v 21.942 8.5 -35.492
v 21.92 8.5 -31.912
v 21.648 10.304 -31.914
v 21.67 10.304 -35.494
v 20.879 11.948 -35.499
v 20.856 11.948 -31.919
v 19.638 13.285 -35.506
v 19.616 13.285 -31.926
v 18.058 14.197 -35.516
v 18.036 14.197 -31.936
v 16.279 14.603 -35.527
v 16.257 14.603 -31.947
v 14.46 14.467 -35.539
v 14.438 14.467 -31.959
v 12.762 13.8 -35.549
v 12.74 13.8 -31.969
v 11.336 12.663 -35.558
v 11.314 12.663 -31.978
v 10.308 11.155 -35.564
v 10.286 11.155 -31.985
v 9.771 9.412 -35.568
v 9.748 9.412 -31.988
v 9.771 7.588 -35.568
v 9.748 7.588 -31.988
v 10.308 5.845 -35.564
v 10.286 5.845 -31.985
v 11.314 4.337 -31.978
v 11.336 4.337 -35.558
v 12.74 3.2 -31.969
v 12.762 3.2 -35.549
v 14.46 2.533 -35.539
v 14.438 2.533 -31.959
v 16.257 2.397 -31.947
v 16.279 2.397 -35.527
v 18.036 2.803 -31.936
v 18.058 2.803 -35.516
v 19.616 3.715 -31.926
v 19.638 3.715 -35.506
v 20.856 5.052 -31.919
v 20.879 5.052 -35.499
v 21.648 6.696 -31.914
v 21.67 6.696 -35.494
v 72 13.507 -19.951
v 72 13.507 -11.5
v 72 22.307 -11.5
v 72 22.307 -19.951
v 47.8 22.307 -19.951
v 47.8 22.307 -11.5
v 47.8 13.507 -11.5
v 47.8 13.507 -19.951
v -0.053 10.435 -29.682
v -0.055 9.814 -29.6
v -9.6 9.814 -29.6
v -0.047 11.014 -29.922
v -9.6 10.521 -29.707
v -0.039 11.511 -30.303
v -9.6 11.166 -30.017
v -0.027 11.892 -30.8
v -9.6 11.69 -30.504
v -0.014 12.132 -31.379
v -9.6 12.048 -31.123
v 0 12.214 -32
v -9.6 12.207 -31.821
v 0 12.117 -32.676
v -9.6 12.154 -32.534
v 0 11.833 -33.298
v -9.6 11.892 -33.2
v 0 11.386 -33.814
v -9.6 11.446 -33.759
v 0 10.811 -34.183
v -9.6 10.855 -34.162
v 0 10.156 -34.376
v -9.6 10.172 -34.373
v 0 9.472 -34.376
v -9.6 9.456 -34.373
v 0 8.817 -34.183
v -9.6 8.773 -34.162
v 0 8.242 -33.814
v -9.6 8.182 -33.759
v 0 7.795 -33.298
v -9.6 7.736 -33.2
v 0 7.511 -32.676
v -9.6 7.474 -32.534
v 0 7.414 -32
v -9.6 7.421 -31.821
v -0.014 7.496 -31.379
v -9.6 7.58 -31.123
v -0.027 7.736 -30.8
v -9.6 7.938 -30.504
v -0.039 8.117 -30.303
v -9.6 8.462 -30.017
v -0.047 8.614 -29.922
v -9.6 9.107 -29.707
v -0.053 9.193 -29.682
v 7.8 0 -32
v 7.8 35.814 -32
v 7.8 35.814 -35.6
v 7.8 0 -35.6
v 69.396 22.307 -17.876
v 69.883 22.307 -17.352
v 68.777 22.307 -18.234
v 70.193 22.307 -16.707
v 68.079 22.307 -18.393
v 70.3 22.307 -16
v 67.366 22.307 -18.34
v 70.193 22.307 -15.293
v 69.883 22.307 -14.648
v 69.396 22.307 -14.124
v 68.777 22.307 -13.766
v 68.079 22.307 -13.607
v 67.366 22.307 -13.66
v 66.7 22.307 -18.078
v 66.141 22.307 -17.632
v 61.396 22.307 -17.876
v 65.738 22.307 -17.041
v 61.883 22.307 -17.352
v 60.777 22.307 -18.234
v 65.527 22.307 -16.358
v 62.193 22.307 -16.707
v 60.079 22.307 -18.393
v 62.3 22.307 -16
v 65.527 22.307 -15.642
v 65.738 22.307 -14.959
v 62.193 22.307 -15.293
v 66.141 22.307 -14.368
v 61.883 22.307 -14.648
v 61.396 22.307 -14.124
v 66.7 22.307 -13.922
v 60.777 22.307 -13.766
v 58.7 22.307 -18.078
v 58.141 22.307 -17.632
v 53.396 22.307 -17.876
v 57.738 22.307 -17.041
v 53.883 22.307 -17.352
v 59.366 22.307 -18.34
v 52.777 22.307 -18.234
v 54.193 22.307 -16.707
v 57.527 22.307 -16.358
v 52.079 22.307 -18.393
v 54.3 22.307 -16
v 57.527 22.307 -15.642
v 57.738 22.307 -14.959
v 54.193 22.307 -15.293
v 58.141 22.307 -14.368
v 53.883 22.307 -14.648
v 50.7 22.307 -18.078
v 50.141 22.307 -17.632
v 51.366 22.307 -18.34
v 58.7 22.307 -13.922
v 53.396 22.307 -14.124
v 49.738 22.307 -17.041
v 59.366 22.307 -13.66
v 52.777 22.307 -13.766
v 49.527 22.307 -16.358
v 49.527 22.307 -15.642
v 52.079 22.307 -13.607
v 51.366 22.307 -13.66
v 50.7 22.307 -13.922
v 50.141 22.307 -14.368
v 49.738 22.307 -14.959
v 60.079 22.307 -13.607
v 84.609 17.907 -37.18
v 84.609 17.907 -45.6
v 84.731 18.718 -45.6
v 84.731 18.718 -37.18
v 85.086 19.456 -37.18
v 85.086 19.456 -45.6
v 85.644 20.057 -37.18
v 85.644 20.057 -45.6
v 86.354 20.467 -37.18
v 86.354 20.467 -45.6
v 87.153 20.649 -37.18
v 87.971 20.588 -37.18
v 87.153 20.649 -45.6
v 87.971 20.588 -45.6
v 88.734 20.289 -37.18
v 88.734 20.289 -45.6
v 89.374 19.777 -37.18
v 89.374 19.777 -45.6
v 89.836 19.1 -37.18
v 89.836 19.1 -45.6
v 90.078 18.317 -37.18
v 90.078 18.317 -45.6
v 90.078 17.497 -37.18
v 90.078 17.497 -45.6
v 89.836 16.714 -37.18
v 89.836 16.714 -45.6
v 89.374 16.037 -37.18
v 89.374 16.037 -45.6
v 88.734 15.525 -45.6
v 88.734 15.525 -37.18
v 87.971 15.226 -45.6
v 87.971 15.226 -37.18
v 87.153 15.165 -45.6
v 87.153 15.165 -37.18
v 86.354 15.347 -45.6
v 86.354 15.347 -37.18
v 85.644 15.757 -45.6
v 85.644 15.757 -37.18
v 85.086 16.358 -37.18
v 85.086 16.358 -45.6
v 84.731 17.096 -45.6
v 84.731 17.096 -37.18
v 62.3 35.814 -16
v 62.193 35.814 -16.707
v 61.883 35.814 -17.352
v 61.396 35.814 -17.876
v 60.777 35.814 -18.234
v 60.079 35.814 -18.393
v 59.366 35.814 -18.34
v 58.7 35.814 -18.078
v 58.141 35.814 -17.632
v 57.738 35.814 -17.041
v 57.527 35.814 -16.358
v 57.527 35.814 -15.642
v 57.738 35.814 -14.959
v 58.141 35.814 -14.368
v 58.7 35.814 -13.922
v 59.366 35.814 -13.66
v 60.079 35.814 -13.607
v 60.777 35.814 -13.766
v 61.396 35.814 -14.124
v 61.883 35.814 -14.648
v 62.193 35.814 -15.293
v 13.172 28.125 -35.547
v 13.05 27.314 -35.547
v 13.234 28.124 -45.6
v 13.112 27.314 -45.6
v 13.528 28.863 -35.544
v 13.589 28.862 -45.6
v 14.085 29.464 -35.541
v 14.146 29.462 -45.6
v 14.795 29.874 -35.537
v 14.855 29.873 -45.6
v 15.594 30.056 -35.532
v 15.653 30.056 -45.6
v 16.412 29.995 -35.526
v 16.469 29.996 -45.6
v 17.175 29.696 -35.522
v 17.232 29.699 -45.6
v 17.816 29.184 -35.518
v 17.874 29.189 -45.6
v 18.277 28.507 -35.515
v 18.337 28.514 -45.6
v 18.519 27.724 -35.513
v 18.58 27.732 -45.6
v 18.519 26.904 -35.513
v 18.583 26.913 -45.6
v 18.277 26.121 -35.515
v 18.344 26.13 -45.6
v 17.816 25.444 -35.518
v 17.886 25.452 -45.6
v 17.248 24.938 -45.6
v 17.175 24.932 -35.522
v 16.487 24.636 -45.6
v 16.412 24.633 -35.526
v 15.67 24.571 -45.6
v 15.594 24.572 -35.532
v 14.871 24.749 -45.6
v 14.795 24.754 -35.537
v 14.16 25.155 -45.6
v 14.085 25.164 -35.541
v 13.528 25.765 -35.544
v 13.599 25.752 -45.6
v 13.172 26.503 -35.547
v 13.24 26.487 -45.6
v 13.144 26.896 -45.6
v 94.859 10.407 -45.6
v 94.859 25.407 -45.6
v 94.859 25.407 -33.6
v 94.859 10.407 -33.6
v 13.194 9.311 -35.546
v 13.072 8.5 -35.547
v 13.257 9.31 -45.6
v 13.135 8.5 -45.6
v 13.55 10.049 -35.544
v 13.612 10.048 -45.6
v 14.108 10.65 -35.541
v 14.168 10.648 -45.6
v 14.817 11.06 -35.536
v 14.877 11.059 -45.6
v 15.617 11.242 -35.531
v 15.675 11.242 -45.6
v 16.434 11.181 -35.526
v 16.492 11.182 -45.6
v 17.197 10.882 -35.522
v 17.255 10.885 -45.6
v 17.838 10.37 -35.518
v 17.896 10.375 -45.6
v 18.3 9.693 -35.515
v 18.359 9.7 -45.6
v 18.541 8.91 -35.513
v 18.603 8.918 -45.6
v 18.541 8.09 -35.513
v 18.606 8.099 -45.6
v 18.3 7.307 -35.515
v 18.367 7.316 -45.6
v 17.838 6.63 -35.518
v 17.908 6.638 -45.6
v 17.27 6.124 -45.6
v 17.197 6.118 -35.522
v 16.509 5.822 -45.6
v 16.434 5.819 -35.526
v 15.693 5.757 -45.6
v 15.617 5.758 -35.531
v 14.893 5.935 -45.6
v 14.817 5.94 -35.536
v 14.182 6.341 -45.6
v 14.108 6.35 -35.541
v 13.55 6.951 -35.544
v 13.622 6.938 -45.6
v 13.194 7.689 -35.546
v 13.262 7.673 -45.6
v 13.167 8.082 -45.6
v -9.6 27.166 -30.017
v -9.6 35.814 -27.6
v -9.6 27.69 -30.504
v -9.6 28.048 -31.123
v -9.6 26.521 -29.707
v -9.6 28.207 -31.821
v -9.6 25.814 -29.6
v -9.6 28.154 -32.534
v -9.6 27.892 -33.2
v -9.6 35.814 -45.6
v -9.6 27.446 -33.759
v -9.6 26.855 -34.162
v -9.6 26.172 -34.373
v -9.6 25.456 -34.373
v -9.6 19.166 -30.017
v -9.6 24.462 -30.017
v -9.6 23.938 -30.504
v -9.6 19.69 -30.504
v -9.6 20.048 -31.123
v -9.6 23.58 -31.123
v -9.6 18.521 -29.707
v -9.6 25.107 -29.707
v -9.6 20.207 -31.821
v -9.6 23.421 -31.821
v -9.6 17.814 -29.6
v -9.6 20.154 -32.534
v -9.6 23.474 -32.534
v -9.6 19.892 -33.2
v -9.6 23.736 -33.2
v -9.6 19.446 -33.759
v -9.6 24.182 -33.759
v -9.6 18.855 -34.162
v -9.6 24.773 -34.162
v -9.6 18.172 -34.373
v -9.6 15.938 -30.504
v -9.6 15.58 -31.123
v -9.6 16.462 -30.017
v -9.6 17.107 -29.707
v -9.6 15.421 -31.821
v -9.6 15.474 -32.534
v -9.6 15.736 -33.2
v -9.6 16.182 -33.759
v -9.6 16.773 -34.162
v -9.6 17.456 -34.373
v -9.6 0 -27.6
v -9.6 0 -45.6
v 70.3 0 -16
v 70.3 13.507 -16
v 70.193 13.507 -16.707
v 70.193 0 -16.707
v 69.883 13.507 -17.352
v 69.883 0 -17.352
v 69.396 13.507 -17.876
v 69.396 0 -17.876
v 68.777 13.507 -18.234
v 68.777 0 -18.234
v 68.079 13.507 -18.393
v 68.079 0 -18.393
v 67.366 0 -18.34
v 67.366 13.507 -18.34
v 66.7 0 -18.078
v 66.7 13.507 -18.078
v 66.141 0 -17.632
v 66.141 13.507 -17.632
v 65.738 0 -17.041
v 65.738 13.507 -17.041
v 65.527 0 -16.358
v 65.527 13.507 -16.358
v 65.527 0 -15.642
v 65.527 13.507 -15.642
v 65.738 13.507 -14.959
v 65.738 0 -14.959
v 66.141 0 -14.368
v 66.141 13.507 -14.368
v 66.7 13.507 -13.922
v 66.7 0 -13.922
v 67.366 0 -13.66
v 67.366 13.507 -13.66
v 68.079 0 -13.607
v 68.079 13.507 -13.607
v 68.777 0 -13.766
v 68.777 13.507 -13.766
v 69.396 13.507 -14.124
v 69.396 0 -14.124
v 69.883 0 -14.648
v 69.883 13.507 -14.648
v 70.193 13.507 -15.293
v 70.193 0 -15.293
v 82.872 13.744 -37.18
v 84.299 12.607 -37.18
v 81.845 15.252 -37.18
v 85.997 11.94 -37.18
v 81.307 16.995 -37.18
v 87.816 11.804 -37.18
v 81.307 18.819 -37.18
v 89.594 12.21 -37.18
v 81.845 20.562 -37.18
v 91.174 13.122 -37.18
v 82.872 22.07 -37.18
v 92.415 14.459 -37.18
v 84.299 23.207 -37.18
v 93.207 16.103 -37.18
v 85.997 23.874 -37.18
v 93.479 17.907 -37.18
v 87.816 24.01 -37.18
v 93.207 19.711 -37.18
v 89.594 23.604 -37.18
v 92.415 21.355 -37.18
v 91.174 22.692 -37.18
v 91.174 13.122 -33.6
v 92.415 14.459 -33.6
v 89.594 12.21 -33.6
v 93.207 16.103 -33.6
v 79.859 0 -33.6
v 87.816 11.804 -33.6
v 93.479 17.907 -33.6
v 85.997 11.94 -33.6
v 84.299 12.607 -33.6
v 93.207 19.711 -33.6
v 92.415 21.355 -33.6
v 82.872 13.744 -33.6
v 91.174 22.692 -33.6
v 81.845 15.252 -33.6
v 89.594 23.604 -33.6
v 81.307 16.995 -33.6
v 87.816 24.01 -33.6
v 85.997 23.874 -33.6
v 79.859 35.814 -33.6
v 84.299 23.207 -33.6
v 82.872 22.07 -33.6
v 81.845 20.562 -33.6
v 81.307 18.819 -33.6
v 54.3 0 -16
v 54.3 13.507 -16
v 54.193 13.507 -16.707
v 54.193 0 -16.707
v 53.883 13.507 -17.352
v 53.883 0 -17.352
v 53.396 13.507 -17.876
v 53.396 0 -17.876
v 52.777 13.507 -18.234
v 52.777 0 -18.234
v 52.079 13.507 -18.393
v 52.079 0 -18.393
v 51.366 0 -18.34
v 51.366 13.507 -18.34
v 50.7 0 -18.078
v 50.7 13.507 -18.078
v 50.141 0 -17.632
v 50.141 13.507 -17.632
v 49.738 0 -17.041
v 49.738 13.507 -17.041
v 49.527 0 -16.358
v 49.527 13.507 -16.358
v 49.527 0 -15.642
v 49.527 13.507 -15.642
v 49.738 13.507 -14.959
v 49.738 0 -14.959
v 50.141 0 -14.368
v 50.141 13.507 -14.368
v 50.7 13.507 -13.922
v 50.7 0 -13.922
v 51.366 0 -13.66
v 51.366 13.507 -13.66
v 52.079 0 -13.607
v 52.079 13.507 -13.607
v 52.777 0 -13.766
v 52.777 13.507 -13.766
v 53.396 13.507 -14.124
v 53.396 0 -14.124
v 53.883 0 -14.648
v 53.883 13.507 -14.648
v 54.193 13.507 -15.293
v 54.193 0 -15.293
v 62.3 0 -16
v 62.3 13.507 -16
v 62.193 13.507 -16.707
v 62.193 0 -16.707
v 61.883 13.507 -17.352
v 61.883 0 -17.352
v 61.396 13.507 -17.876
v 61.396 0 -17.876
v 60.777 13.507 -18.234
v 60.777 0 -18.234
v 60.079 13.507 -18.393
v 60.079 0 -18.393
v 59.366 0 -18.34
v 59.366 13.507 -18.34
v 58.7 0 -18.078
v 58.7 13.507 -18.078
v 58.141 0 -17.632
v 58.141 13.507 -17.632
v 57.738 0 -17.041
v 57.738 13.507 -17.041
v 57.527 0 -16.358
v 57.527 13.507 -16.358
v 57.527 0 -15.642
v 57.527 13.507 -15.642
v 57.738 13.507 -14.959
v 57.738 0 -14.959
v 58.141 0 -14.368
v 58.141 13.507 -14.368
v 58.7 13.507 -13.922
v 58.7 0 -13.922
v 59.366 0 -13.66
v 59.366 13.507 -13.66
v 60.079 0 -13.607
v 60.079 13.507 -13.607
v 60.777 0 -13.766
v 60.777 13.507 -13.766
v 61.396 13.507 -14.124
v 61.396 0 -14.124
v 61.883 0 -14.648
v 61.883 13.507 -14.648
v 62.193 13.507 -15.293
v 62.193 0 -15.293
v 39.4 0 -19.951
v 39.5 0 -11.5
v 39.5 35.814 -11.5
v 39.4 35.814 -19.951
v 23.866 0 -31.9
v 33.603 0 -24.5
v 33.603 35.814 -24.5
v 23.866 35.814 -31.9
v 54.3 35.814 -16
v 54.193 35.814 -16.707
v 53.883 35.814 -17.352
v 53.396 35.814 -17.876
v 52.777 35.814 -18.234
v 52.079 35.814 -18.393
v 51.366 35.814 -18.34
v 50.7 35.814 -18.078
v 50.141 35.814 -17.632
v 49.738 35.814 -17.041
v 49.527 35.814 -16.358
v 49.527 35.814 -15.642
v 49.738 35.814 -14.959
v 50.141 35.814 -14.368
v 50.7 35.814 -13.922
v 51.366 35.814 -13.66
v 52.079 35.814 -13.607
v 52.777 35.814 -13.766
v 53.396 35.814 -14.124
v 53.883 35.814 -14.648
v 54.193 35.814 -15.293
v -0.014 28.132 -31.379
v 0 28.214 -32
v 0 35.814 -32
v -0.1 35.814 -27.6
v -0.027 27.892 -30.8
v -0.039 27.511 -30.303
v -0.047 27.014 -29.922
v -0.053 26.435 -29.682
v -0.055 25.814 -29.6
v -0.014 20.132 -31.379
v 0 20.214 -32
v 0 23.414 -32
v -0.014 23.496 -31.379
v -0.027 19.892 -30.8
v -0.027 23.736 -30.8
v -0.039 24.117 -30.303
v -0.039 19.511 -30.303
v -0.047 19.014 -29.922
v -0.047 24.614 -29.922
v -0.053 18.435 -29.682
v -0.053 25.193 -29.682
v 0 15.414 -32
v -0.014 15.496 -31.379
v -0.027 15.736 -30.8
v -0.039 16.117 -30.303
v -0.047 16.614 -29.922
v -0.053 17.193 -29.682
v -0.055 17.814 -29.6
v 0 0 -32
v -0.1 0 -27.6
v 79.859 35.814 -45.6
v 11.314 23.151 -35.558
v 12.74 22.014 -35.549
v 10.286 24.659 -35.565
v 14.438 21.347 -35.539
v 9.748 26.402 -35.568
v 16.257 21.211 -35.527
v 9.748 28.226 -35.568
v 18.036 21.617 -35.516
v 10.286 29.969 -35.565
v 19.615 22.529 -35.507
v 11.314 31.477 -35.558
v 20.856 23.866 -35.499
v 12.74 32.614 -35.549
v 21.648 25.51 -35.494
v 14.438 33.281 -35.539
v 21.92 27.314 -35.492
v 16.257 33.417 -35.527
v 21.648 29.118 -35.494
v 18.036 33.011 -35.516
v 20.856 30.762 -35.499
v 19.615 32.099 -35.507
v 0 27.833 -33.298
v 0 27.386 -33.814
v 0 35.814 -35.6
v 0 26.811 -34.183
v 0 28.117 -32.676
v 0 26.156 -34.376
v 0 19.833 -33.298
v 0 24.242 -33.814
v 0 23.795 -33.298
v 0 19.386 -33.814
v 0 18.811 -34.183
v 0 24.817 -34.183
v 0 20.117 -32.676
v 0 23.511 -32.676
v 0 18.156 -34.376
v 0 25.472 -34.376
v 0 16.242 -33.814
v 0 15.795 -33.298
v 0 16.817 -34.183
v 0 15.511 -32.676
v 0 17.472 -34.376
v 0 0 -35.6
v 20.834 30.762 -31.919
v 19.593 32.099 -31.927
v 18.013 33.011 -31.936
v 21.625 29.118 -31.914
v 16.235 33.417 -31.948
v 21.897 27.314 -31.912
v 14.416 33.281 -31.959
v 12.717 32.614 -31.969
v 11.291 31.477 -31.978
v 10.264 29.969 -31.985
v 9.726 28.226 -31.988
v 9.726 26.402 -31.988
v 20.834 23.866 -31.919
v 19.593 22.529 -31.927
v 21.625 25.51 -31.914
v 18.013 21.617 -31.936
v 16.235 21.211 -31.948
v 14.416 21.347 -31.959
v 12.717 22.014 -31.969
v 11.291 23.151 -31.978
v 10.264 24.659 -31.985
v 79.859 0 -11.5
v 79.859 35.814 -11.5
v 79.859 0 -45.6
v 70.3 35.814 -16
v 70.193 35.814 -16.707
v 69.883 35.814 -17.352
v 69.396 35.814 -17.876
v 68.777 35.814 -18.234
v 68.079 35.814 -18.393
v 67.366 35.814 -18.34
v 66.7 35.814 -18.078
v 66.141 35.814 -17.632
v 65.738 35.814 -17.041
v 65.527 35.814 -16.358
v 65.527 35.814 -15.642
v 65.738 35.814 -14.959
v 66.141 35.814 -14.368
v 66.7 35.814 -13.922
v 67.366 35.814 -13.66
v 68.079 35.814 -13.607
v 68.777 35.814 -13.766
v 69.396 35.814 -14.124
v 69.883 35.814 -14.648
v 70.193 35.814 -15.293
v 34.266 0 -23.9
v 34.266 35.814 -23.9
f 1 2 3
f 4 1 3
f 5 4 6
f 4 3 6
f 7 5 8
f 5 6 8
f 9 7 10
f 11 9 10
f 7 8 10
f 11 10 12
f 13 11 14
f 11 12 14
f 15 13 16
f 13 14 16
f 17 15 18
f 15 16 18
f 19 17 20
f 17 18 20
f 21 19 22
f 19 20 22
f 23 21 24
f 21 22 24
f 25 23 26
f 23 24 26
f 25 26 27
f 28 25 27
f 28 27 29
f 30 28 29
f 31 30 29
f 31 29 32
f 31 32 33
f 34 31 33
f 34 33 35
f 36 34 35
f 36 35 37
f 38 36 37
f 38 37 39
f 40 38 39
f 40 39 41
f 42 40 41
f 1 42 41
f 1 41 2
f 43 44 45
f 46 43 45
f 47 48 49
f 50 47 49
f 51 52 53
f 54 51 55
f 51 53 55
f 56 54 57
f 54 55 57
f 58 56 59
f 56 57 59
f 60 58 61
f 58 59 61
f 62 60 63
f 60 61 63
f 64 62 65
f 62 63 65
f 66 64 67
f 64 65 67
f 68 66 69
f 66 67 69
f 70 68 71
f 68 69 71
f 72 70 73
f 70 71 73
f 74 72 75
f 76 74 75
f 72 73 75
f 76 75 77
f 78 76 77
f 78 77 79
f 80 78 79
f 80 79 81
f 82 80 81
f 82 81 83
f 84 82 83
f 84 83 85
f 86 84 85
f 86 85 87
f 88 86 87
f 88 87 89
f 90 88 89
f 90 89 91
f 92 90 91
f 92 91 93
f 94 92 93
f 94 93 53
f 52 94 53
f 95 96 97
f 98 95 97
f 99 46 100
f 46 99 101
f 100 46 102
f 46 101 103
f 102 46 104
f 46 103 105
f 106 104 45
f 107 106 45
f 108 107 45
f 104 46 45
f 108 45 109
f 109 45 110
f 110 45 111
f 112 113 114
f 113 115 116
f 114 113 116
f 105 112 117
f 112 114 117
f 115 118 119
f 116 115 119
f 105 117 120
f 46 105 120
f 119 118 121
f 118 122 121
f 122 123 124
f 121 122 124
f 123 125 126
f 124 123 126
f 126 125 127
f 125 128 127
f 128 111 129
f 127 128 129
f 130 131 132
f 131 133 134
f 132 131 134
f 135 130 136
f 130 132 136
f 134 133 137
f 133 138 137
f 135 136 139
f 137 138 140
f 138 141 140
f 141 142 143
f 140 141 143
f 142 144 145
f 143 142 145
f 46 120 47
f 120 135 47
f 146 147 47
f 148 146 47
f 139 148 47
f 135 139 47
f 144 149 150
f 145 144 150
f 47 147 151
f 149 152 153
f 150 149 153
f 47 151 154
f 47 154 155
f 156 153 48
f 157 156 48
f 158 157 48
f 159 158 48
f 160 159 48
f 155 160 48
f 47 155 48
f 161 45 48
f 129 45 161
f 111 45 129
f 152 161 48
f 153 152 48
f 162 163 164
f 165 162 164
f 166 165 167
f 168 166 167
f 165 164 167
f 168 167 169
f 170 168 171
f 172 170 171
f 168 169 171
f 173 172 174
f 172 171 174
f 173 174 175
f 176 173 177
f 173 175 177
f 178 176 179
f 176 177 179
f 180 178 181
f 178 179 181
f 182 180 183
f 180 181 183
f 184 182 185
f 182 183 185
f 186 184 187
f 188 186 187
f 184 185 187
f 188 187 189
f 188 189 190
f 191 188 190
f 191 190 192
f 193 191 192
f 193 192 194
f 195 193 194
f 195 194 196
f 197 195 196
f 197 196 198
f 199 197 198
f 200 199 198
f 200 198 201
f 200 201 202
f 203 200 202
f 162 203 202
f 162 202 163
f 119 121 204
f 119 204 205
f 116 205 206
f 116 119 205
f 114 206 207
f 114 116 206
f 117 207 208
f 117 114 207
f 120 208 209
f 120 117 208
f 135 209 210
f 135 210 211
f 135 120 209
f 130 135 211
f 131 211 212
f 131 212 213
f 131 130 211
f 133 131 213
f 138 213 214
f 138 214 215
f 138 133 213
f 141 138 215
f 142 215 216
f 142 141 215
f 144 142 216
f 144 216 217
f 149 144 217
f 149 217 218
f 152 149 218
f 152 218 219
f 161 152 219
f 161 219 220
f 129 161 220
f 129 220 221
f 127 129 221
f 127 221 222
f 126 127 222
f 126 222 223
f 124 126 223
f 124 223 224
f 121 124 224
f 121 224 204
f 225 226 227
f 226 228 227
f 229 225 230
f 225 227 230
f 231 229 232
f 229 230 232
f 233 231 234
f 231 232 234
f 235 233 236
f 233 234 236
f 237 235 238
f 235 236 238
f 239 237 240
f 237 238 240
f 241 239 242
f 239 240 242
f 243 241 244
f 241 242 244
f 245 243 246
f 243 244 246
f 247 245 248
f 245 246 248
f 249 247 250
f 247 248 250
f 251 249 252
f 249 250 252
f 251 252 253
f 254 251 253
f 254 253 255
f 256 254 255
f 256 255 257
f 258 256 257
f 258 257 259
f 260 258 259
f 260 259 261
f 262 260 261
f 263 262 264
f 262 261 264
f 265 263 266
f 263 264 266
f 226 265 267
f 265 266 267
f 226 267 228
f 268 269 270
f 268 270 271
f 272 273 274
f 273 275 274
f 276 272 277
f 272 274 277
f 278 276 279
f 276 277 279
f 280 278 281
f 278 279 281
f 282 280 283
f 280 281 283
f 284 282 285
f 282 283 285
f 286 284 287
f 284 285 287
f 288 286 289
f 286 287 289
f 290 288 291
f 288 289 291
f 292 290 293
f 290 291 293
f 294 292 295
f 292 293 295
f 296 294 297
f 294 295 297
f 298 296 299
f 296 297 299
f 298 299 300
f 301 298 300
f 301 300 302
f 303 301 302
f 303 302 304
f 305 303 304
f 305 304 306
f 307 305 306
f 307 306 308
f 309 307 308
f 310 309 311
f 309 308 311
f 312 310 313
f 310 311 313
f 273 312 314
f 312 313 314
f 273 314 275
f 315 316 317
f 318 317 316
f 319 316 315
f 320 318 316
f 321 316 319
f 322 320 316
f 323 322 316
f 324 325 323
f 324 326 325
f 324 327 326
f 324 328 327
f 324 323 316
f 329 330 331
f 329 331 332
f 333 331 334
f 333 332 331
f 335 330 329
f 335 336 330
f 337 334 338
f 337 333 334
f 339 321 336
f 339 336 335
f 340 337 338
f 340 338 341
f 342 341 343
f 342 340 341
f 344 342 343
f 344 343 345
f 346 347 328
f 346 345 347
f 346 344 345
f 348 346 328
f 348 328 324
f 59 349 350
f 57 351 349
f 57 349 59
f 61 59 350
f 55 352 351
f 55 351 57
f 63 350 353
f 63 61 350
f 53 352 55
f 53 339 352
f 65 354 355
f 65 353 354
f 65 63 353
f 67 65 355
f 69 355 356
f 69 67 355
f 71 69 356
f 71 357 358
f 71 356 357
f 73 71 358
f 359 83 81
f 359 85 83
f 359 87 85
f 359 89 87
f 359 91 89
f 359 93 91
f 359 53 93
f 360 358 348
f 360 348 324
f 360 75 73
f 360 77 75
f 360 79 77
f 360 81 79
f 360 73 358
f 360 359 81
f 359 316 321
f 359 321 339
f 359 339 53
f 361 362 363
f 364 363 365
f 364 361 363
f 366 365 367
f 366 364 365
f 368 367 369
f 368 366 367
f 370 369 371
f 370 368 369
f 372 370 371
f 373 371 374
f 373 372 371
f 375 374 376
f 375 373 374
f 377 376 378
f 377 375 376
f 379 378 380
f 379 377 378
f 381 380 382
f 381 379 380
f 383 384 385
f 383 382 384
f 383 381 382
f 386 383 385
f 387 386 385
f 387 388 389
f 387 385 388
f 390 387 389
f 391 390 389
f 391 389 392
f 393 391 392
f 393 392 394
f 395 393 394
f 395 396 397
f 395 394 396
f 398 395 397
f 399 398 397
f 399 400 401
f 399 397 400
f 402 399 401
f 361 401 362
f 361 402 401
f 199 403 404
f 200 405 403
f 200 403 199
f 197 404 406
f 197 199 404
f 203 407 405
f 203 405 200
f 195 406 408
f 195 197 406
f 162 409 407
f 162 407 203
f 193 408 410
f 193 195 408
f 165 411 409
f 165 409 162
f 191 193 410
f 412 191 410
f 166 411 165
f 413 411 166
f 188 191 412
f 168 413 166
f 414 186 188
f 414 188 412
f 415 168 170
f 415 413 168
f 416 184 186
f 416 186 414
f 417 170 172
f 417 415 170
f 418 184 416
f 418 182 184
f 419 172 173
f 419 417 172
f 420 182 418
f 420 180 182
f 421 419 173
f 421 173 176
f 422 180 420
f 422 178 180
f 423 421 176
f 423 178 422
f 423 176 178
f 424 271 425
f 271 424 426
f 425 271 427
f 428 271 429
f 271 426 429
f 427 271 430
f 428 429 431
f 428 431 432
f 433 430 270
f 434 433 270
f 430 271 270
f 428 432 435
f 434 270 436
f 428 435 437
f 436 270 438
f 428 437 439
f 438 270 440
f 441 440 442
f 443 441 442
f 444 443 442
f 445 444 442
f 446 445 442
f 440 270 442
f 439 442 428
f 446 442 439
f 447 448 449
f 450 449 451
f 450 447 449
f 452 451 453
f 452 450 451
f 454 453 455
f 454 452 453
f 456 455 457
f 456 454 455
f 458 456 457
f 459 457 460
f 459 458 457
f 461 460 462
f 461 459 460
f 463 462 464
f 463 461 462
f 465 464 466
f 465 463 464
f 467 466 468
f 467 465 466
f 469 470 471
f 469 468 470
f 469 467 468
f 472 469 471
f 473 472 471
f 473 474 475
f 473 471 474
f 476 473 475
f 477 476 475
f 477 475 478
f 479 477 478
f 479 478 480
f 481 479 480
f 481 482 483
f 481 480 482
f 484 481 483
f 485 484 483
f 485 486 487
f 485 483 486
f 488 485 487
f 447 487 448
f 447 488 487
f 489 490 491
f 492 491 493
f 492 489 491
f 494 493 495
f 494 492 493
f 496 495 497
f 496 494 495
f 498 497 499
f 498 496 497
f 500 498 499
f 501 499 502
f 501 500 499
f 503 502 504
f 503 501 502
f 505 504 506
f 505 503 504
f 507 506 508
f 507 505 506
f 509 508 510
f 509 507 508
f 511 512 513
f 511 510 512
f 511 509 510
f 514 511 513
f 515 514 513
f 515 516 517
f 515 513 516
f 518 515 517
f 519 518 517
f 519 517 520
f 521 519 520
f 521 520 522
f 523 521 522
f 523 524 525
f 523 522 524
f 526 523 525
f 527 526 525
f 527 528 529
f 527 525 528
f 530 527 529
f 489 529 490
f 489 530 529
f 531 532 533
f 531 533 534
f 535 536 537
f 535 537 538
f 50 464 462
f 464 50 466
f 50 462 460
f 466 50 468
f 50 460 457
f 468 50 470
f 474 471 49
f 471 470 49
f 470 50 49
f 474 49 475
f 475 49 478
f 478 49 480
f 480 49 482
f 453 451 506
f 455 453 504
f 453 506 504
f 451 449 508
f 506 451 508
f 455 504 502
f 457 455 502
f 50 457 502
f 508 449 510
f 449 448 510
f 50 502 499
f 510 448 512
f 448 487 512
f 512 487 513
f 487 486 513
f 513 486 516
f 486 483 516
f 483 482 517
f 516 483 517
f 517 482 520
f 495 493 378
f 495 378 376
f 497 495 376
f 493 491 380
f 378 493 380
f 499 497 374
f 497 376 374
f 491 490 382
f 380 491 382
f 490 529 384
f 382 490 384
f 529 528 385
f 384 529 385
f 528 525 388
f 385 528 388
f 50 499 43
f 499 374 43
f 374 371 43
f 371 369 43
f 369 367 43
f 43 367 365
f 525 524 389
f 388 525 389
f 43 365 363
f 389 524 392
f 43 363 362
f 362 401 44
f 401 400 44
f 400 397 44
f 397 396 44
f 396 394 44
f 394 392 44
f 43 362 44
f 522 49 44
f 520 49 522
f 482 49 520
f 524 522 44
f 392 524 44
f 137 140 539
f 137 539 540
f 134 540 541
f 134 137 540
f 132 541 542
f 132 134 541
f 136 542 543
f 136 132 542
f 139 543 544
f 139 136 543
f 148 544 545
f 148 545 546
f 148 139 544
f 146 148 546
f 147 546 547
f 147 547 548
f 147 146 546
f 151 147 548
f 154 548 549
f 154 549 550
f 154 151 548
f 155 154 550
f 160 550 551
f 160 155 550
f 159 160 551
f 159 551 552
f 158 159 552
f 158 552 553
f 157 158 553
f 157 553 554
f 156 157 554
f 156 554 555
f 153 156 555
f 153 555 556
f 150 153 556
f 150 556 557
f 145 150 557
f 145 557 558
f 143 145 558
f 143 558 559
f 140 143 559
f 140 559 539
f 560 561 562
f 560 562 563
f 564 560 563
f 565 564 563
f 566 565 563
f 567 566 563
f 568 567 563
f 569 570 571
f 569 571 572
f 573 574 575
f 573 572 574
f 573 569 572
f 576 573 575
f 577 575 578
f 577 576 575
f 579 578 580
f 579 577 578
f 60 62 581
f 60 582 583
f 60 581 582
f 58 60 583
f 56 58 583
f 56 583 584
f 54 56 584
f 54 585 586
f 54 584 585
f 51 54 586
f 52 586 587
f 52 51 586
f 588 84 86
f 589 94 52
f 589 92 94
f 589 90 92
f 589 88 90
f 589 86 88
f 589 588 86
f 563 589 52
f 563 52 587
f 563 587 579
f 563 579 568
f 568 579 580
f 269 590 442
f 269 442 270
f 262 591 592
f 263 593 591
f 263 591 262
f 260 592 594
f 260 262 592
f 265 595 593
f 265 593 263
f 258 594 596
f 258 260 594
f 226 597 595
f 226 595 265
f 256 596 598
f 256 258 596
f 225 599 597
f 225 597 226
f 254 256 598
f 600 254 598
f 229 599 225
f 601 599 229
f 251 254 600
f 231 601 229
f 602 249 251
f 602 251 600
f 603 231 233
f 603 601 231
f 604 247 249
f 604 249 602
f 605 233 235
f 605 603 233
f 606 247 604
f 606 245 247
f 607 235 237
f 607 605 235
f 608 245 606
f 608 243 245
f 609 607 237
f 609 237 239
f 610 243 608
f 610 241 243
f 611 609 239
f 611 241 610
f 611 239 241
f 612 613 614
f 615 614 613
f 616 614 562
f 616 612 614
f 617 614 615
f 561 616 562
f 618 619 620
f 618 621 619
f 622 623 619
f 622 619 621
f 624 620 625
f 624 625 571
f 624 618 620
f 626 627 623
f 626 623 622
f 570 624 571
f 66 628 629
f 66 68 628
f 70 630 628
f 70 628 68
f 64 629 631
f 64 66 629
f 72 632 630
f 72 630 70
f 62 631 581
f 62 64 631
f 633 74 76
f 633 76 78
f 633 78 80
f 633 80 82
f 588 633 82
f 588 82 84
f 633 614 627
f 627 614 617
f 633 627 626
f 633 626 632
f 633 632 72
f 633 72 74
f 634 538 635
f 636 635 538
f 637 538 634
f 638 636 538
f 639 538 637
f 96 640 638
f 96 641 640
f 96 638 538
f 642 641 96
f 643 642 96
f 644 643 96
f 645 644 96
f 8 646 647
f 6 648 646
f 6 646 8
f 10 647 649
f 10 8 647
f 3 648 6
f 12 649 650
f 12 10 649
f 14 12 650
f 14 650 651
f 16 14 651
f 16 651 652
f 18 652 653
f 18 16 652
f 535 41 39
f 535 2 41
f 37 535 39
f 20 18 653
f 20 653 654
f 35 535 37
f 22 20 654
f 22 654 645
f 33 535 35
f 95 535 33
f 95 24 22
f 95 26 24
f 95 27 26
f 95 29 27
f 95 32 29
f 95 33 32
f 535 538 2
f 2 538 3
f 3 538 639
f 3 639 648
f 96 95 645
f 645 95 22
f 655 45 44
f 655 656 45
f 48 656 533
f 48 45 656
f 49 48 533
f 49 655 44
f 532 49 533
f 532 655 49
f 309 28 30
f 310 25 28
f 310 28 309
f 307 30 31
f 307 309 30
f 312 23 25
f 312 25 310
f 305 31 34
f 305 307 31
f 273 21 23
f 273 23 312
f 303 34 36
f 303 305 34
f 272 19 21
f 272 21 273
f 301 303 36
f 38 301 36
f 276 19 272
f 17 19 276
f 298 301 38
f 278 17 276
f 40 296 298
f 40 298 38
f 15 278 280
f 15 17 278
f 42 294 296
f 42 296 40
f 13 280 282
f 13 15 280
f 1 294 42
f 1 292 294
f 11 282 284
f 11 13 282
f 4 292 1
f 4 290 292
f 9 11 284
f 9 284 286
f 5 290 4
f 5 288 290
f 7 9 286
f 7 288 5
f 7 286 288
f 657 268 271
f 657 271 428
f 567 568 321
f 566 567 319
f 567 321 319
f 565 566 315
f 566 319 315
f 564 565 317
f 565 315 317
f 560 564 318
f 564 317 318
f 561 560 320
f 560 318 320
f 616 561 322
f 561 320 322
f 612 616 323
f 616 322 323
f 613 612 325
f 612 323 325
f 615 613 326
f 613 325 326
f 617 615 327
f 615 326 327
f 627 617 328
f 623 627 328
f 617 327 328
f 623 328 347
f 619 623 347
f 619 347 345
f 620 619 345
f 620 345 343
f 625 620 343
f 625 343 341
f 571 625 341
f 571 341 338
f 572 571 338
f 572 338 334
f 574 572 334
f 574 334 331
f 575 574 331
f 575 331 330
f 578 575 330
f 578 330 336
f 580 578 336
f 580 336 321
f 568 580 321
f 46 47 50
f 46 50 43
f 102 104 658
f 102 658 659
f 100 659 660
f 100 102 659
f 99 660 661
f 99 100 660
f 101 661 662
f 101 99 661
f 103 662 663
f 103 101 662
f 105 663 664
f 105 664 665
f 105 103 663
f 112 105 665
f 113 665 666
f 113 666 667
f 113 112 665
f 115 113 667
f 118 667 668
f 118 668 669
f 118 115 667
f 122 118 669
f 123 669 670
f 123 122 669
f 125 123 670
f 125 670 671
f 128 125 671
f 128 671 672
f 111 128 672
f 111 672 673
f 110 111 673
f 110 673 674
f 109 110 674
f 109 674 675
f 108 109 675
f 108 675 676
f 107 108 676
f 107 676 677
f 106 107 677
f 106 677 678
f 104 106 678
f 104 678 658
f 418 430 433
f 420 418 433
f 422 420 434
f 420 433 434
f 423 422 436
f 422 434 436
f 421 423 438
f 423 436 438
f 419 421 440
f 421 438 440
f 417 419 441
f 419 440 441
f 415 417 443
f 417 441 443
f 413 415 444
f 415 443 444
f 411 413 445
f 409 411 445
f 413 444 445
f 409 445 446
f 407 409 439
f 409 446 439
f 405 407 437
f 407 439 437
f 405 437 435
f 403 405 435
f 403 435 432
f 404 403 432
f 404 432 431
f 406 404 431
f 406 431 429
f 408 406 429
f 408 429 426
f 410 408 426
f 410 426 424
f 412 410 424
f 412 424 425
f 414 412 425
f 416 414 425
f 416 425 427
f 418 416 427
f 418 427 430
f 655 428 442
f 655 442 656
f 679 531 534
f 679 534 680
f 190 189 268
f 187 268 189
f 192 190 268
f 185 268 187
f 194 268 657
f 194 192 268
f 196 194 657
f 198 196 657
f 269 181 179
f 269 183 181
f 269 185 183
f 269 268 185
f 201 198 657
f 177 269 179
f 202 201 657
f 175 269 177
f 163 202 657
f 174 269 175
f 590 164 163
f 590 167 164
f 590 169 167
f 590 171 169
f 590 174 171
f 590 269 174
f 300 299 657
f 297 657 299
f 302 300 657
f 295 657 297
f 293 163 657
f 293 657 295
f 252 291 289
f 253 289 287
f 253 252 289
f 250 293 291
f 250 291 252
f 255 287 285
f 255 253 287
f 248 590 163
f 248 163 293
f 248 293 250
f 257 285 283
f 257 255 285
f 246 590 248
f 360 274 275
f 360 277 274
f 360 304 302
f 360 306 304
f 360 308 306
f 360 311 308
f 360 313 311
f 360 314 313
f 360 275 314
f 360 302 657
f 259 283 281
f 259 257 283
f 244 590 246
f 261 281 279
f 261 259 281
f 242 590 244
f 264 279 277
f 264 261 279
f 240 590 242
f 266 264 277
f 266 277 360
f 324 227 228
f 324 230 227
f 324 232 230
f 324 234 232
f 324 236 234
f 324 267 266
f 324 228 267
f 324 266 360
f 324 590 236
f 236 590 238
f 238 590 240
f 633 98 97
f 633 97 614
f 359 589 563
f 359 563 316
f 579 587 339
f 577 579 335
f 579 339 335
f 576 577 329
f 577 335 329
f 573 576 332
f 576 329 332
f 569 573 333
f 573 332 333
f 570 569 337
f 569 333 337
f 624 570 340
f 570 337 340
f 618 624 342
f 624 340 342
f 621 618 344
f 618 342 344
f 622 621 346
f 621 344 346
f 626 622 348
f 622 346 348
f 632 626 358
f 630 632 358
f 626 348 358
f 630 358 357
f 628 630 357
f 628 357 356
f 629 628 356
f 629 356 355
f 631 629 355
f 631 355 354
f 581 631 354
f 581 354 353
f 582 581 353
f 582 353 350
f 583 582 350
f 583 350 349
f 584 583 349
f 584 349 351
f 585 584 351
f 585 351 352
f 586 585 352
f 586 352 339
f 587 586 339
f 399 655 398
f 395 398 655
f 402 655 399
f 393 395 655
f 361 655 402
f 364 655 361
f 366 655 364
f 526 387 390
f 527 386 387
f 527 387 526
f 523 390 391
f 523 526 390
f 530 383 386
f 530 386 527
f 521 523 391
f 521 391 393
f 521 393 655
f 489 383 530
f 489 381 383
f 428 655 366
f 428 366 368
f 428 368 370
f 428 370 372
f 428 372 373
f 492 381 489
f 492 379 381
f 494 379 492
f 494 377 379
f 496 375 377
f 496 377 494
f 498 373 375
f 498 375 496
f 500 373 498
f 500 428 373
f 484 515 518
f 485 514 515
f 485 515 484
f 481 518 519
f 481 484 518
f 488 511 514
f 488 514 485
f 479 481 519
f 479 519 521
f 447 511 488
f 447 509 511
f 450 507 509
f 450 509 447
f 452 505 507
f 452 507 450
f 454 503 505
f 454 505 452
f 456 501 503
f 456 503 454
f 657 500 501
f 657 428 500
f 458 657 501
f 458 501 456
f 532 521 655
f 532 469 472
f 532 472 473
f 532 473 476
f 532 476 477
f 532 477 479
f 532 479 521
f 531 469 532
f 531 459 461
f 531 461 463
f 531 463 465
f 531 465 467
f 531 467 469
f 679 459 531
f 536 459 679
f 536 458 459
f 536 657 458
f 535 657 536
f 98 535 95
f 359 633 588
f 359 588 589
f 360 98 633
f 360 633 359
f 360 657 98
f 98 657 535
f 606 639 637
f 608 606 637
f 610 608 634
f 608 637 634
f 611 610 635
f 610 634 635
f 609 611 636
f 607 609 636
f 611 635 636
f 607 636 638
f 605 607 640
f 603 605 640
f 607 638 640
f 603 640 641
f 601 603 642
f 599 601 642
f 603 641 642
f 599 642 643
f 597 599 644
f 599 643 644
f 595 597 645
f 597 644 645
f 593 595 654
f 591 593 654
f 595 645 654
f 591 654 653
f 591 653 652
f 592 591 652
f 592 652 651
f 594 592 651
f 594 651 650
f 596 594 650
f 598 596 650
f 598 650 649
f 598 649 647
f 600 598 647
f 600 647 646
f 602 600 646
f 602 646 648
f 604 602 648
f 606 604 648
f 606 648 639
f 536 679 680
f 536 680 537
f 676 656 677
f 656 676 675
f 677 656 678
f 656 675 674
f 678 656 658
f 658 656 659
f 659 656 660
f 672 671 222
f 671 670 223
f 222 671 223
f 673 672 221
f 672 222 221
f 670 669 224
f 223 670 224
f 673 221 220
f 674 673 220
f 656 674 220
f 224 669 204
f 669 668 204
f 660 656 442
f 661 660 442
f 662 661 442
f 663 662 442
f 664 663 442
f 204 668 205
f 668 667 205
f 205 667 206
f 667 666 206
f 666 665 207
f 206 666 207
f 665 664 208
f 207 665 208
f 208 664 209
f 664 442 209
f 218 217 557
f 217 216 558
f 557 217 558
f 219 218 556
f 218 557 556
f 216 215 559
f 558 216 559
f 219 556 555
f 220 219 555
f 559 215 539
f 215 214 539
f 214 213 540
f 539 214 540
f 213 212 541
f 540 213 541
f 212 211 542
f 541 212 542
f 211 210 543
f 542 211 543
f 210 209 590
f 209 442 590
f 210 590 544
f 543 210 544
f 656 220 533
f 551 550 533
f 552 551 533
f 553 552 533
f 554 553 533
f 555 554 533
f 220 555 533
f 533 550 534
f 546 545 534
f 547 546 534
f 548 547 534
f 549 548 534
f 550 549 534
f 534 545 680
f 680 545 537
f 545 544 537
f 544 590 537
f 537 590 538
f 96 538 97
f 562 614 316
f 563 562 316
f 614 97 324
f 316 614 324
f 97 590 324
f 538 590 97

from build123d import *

# Parameters (mm, degrees)
SKETCH2_R                               = 2.4
BOSS_EXTRUDE1_DEPTH                     = 35.814
CUT_EXTRUDE1_DEPTH                      = 8.45076
CBORE_FOR_M5_HEX_HEAD_BOLT1_D           = 5.5
CBORE_FOR_M5_HEX_HEAD_BOLT1_CBORE_D     = 12.24
CBORE_FOR_M5_HEX_HEAD_BOLT1_CBORE_DEPTH = 3.58
BOSS_EXTRUDE2_DEPTH                     = 12
CBORE_FOR_M5_HEX_HEAD_BOLT2_D           = 5.5
CBORE_FOR_M5_HEX_HEAD_BOLT2_DEPTH       = 12
CBORE_FOR_M5_HEX_HEAD_BOLT2_CBORE_D     = 12.24
CBORE_FOR_M5_HEX_HEAD_BOLT2_CBORE_DEPTH = 3.58
CUT_EXTRUDE2_REACH                      = 106.459
SKETCH11_R                              = 2.4


with BuildPart() as part:
    # Sketch2 → Boss-Extrude1 (new body)
    with BuildSketch(Plane(origin=(0, 0, 0), x_dir=(1, 0, 0), z_dir=(0, 1, 0))):
        Polygon((79.858578644, 45.6), (79.858578644, 11.5), (39.5, 11.5), (39.4, 19.95075985), (34.265987805, 23.9), (33.603154542, 24.5), (23.866312437, 31.9), (7.8, 32), (7.8, 35.6), (0, 35.6), (0, 32), (-0.1, 27.6), (-9.6, 27.6), (-9.6, 45.6), align=None)
        with Locations((67.9, 16)):
            Circle(SKETCH2_R, mode=Mode.SUBTRACT)
        with Locations((51.9, 16)):
            Circle(SKETCH2_R, mode=Mode.SUBTRACT)
        with Locations((59.9, 16)):
            Circle(SKETCH2_R, mode=Mode.SUBTRACT)
    extrude(amount=BOSS_EXTRUDE1_DEPTH)

    # Sketch4 → Cut-Extrude1 (cut)
    with BuildSketch(Plane.XY.offset(-11.5)):
        Polygon((67.9, 22.307), (51.9, 22.307), (47.8, 22.307), (47.8, 13.507), (51.9, 13.507), (67.9, 13.507), (72, 13.507), (72, 22.307), align=None)
    extrude(amount=-CUT_EXTRUDE1_DEPTH, mode=Mode.SUBTRACT)

    # CBORE for M5 Hex Head Bolt1 (through all)
    with Locations(Plane(origin=(0.199468966, 0, -32.047307253), x_dir=(0.99998063, 0, 0.006224083), z_dir=(-0.006224083, 0, 0.99998063))):
        with Locations((15.578271559, 27.314), (15.600678258, 8.5)):
            CounterBoreHole(CBORE_FOR_M5_HEX_HEAD_BOLT1_D / 2, CBORE_FOR_M5_HEX_HEAD_BOLT1_CBORE_D / 2, CBORE_FOR_M5_HEX_HEAD_BOLT1_CBORE_DEPTH)

    # Sketch8 → Boss-Extrude2 (add)
    with BuildSketch(Plane(origin=(0, 0, -45.6), x_dir=(-1, 0, 0), z_dir=(0, 0, -1))):
        Polygon((-79.858578644, 35.814), (-94.858578644, 25.407), (-94.858578644, 10.407), (-79.858578644, 0), align=None)
    extrude(amount=-BOSS_EXTRUDE2_DEPTH)

    # CBORE for M5 Hex Head Bolt2
    with Locations(Plane.XY.offset(-33.6)):
        with Locations((87.358578644, 17.907)):
            CounterBoreHole(CBORE_FOR_M5_HEX_HEAD_BOLT2_D / 2, CBORE_FOR_M5_HEX_HEAD_BOLT2_CBORE_D / 2, CBORE_FOR_M5_HEX_HEAD_BOLT2_CBORE_DEPTH, depth=CBORE_FOR_M5_HEX_HEAD_BOLT2_DEPTH)

    # Sketch11 → Cut-Extrude2 (cut, up to next)
    with BuildSketch(Plane.ZY.offset(9.6), mode=Mode.PRIVATE) as cut_extrude2_sk1:
        with Locations((-32, 25.814)):
            Circle(SKETCH11_R)
    cut_extrude2_tool1 = extrude(cut_extrude2_sk1.sketch, amount=-CUT_EXTRUDE2_REACH, mode=Mode.PRIVATE) & part.part
    add(cut_extrude2_tool1.solids().sort_by_distance((-9.6, 25.814, -32))[0], mode=Mode.SUBTRACT)
    # Sketch11 → Cut-Extrude2 (cut, up to next)
    with BuildSketch(Plane.ZY.offset(9.6), mode=Mode.PRIVATE) as cut_extrude2_sk2:
        with Locations((-32, 17.814)):
            Circle(SKETCH11_R)
    cut_extrude2_tool2 = extrude(cut_extrude2_sk2.sketch, amount=-CUT_EXTRUDE2_REACH, mode=Mode.PRIVATE) & part.part
    add(cut_extrude2_tool2.solids().sort_by_distance((-9.6, 17.814, -32))[0], mode=Mode.SUBTRACT)
    # Sketch11 → Cut-Extrude2 (cut, up to next)
    with BuildSketch(Plane.ZY.offset(9.6), mode=Mode.PRIVATE) as cut_extrude2_sk3:
        with Locations((-32, 9.814)):
            Circle(SKETCH11_R)
    cut_extrude2_tool3 = extrude(cut_extrude2_sk3.sketch, amount=-CUT_EXTRUDE2_REACH, mode=Mode.PRIVATE) & part.part
    add(cut_extrude2_tool3.solids().sort_by_distance((-9.6, 9.814, -32))[0], mode=Mode.SUBTRACT)


solid = part.part
